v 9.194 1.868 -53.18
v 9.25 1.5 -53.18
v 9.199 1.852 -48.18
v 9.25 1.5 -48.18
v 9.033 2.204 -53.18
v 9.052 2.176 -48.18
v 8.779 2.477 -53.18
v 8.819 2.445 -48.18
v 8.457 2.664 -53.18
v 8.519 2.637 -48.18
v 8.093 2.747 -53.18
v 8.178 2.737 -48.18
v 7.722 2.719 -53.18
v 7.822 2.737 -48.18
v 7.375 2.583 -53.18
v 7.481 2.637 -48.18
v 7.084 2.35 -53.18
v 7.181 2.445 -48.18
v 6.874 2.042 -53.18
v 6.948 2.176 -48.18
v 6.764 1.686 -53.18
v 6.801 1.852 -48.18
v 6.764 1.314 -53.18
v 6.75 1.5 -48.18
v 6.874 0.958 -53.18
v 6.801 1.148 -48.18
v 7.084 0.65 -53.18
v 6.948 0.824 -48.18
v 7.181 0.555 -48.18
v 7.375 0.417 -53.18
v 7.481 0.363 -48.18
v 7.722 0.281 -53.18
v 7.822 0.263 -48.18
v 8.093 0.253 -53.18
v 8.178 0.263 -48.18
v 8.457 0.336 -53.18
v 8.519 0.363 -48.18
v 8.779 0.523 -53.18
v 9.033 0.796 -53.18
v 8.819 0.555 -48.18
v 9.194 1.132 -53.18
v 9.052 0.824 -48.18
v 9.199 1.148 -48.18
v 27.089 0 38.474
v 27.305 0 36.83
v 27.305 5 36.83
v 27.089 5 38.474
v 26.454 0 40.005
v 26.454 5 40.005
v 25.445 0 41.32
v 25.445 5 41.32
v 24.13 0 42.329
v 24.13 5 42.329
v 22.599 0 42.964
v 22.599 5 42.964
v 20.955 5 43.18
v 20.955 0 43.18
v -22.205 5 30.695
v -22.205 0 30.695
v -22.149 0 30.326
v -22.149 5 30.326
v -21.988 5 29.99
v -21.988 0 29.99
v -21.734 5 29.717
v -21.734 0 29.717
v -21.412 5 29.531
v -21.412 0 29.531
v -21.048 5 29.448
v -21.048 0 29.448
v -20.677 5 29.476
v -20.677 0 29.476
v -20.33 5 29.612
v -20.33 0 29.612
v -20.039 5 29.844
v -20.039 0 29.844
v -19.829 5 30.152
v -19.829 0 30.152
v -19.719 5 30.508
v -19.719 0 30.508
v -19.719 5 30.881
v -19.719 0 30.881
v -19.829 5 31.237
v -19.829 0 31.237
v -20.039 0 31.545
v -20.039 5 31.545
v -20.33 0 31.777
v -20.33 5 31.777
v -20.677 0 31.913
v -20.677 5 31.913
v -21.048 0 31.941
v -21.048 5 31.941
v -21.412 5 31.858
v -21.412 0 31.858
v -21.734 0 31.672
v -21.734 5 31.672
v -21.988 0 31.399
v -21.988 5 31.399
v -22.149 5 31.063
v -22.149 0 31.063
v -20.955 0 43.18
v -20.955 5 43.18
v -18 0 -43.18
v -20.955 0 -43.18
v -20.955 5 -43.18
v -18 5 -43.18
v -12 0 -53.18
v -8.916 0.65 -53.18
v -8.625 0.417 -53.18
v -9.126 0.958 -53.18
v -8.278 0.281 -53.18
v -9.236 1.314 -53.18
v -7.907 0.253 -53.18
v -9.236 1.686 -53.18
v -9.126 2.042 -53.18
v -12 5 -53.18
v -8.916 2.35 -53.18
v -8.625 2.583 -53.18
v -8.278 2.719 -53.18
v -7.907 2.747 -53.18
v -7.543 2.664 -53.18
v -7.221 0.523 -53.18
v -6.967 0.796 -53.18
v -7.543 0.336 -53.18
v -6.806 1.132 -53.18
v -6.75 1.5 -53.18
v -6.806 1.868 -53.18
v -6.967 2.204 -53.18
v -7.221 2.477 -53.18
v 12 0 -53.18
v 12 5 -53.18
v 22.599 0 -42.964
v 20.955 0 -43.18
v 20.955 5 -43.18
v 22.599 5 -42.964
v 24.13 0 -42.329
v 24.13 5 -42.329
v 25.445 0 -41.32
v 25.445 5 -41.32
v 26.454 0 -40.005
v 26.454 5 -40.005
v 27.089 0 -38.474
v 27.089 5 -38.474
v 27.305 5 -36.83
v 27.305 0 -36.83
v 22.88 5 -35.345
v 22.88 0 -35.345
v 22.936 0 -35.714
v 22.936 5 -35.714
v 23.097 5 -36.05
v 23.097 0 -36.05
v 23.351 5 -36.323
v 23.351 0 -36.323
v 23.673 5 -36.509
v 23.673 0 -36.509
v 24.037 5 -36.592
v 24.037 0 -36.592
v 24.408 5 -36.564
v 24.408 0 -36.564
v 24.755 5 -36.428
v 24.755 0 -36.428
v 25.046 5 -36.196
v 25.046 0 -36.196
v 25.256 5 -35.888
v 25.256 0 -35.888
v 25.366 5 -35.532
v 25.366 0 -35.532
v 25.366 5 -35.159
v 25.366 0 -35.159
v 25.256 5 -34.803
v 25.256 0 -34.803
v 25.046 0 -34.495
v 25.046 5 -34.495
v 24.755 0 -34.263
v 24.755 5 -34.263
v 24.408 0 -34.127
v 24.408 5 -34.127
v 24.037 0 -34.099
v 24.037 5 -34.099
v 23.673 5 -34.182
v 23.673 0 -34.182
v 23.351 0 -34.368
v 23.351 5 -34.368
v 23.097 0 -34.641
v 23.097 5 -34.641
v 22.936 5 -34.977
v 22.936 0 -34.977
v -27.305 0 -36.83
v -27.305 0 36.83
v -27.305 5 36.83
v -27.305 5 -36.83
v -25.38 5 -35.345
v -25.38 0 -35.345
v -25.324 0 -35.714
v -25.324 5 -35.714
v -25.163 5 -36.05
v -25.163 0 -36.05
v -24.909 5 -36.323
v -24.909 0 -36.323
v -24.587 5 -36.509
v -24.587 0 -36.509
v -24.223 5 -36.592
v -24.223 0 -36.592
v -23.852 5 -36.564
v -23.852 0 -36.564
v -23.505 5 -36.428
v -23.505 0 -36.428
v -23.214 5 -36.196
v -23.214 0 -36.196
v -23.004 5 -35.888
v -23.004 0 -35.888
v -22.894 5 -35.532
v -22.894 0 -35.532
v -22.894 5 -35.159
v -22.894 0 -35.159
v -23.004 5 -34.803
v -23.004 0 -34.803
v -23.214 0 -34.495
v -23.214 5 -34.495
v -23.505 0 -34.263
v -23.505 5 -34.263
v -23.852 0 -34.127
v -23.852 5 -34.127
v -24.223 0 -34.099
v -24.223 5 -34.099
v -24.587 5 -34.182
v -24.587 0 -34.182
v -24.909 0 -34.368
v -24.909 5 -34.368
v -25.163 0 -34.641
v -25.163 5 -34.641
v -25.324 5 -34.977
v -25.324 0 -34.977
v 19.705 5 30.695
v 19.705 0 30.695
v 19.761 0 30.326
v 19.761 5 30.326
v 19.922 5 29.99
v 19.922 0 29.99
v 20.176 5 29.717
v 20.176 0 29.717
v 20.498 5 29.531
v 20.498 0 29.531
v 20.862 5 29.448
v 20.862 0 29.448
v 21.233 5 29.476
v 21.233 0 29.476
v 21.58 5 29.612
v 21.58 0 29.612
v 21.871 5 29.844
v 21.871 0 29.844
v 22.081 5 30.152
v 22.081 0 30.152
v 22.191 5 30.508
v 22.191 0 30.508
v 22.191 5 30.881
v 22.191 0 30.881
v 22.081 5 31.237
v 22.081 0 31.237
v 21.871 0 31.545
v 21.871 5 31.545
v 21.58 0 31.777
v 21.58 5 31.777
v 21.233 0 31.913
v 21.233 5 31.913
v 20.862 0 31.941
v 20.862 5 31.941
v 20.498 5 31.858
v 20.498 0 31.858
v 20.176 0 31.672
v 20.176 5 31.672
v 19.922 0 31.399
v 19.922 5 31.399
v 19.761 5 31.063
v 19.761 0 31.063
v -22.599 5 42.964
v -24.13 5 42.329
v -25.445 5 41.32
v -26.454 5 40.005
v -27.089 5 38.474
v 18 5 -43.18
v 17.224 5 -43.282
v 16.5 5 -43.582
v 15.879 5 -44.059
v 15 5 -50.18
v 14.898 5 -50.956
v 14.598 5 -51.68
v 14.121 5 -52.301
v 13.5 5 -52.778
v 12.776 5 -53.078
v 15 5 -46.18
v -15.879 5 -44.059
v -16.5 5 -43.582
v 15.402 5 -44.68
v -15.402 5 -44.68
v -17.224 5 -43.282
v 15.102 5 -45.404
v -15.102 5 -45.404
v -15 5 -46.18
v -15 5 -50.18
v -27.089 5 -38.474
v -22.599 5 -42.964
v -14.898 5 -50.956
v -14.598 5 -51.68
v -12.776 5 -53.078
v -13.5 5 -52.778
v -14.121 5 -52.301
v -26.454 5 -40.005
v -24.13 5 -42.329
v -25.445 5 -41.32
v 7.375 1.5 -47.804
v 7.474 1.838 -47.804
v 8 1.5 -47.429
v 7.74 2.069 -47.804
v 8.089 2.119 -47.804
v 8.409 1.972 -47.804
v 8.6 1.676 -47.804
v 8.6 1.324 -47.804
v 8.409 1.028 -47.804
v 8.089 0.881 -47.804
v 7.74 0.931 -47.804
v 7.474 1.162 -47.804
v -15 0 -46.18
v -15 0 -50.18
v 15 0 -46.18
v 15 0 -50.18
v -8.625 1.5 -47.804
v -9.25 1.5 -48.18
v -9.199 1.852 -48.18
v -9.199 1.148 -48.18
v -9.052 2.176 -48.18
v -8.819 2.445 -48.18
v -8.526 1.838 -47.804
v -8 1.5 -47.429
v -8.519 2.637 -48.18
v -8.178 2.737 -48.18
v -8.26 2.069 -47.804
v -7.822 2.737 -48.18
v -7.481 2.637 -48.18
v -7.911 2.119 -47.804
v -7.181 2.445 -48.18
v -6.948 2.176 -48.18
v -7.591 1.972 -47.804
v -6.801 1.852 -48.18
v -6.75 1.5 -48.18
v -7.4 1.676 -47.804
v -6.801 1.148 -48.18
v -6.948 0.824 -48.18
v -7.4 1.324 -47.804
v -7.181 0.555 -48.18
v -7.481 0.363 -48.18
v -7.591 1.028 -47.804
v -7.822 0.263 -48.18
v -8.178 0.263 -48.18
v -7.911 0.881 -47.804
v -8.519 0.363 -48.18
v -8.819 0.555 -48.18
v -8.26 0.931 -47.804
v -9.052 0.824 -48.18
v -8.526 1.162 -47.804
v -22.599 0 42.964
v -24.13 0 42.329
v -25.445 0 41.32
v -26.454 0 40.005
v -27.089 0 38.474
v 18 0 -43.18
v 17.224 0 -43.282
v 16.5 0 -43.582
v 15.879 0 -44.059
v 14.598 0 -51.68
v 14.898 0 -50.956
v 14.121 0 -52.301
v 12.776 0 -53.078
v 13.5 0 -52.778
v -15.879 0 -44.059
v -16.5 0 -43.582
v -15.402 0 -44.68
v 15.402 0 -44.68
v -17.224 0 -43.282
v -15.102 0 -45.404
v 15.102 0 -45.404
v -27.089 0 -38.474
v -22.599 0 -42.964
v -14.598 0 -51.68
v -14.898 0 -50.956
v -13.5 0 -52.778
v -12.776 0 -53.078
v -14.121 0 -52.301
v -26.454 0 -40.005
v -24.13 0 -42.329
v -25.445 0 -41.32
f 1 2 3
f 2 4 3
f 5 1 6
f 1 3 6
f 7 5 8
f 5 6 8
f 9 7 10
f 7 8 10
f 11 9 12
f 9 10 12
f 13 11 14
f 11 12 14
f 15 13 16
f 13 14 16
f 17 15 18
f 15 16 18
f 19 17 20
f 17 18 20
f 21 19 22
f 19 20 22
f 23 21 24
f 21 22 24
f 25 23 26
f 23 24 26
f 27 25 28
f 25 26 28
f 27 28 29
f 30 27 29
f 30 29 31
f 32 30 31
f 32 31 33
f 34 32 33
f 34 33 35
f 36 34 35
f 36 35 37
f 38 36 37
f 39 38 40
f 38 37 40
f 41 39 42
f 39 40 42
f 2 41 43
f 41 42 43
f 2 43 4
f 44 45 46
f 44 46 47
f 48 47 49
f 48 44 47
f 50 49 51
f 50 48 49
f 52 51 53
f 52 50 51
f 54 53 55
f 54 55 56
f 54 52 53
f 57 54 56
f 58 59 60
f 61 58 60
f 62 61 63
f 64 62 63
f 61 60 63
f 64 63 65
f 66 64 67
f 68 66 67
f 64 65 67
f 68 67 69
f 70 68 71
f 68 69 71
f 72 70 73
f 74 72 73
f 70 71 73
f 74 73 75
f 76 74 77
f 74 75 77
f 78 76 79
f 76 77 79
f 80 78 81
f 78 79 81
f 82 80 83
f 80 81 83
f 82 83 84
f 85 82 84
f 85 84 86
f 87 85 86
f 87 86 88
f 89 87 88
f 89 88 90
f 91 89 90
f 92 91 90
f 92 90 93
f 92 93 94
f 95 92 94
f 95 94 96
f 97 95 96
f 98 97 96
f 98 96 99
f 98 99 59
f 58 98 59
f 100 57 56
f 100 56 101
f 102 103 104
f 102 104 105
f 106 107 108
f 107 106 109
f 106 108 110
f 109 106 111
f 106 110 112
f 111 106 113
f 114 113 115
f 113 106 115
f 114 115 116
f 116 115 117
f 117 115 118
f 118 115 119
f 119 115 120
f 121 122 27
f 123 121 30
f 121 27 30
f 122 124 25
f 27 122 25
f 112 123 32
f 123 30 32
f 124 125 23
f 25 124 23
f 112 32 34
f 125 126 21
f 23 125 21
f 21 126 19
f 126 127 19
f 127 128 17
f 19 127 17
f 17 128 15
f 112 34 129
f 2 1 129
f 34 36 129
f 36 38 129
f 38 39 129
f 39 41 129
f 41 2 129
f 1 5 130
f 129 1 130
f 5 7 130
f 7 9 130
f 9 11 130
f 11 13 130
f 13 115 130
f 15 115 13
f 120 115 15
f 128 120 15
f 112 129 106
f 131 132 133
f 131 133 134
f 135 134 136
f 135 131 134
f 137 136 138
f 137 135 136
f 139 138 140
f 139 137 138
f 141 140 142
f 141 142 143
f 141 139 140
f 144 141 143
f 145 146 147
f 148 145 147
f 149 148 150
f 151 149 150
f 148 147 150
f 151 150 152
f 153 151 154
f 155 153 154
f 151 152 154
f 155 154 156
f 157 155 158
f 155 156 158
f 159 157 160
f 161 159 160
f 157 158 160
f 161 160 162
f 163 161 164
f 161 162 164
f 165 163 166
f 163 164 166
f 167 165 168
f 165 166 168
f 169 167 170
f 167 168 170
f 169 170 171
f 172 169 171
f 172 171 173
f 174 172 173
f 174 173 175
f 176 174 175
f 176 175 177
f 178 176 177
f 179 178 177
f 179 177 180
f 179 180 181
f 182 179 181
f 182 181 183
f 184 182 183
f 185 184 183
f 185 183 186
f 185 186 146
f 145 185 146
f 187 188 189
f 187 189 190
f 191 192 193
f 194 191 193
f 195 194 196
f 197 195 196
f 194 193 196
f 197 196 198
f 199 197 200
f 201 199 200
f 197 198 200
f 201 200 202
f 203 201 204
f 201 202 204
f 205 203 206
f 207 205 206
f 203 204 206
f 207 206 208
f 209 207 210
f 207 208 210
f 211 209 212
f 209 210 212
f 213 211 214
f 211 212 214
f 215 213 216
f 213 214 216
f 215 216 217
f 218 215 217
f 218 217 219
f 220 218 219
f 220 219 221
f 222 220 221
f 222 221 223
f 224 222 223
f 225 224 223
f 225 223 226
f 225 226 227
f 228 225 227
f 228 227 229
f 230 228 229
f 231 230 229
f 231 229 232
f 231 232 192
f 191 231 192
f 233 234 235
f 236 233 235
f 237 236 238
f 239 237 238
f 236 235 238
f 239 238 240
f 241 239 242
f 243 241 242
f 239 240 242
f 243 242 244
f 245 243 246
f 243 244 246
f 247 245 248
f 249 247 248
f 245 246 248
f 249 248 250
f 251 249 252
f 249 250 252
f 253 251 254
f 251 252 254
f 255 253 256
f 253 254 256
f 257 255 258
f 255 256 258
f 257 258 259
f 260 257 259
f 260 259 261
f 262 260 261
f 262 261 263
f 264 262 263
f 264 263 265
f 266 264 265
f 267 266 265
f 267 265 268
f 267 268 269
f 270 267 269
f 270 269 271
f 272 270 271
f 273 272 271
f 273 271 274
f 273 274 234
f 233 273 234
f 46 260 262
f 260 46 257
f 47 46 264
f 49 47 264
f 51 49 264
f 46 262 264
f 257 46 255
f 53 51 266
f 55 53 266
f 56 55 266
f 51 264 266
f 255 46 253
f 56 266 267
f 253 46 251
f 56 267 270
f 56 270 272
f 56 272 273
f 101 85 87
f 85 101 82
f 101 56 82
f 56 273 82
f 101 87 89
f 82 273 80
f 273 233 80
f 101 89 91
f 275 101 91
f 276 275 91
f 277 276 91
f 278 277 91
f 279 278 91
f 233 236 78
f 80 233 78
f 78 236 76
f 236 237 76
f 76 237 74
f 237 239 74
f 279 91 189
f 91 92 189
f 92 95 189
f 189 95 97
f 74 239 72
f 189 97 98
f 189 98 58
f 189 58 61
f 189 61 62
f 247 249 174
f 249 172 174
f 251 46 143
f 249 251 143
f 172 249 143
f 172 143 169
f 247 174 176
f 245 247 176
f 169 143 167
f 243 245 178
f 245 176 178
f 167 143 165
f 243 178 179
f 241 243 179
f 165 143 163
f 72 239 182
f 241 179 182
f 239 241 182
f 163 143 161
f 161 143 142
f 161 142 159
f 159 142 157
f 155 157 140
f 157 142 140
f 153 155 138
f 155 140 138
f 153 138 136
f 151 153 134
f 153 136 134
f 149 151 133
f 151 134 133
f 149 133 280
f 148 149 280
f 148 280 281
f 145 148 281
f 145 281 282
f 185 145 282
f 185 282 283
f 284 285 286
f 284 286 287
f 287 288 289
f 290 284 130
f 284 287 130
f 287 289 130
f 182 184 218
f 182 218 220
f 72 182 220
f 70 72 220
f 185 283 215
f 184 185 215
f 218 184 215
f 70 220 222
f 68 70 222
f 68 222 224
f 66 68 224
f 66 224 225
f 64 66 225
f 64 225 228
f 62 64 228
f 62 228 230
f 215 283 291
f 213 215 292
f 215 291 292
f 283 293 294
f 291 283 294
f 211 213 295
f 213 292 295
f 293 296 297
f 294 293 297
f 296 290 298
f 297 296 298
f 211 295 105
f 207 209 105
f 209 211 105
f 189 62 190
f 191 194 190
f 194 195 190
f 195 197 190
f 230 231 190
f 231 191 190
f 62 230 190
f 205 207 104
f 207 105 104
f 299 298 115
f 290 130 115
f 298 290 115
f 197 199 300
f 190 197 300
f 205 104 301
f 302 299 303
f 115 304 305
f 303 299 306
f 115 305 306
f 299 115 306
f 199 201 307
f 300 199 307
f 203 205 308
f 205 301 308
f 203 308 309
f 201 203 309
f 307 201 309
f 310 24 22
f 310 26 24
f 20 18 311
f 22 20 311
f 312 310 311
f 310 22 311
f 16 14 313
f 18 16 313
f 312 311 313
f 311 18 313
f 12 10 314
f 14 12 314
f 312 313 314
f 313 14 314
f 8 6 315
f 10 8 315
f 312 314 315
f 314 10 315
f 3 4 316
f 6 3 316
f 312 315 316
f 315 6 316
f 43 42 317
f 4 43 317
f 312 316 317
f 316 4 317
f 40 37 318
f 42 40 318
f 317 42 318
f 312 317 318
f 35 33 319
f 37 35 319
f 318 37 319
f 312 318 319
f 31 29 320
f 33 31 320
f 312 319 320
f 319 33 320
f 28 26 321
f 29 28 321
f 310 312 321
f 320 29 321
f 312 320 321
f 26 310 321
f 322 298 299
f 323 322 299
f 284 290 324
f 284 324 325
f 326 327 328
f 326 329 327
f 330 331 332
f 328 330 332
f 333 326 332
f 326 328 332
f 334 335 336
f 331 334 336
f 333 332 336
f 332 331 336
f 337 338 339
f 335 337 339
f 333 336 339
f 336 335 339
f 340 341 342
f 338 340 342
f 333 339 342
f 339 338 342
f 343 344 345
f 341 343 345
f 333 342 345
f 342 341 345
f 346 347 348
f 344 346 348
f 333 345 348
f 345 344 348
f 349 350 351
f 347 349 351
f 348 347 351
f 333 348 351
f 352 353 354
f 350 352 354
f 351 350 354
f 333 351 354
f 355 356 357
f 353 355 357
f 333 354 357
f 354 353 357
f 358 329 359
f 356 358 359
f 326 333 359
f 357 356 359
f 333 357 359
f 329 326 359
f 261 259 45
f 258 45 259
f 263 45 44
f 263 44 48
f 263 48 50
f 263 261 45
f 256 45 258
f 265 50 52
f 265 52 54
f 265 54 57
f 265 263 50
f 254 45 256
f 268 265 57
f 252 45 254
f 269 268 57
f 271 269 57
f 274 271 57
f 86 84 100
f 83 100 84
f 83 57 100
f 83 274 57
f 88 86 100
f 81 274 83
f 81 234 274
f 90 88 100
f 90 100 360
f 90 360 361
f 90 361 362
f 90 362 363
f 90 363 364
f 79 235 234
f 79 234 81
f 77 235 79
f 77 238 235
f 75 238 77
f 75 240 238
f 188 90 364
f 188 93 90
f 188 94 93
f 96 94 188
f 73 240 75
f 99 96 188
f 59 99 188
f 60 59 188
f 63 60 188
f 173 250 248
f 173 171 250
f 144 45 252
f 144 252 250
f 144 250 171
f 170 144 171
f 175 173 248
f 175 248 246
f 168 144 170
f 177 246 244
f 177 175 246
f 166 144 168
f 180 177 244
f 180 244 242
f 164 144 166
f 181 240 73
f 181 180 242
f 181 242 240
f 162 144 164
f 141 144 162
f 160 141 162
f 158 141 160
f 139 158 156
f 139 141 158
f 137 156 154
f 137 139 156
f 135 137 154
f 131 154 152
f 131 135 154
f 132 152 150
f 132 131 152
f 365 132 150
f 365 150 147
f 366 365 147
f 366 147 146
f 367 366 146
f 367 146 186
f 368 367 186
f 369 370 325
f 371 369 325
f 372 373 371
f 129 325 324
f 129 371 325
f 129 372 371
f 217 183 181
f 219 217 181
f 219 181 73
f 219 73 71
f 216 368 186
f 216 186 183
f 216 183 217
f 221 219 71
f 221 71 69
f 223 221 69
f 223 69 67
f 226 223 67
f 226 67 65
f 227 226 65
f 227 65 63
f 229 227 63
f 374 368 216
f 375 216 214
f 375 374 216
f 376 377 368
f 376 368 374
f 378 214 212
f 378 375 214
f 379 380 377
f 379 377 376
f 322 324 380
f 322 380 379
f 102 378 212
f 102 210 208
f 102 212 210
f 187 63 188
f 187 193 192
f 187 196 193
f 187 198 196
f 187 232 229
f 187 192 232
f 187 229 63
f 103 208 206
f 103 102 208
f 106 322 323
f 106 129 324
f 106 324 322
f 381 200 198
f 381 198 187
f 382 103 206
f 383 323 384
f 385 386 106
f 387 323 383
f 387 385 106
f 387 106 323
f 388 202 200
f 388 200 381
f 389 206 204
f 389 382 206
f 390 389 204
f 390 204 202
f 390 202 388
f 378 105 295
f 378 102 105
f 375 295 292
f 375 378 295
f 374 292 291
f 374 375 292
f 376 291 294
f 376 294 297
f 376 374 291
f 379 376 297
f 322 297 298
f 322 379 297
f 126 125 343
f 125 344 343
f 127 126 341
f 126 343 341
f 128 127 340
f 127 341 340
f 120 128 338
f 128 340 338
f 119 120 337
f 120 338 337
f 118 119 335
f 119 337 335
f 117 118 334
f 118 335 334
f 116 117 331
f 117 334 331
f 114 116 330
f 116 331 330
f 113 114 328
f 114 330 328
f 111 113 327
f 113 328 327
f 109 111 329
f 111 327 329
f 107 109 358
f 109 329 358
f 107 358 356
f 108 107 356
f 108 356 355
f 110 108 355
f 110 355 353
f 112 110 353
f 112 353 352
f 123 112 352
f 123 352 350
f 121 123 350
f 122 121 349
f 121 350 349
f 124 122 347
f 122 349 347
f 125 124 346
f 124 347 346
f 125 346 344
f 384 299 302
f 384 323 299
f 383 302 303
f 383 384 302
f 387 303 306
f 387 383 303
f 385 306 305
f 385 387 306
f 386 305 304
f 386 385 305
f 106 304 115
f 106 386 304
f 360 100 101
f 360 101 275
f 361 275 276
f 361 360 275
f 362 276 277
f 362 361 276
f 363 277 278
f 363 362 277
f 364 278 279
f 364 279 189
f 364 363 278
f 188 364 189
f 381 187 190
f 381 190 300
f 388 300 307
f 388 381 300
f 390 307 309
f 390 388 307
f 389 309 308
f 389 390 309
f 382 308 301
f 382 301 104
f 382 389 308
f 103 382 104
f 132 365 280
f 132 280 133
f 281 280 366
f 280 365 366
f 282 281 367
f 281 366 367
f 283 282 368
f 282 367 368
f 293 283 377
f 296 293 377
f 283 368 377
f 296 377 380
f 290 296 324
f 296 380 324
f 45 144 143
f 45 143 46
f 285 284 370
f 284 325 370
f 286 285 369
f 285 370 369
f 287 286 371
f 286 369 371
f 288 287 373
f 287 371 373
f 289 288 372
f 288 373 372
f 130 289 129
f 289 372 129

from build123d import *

# Parameters (mm, degrees)
BOSS_EXTRUDE1_DEPTH             = 5
TAP_DRILL_FOR_M3X0_5_TAP1_D     = 2.5
SKETCH5_W                       = 30
SKETCH5_H                       = 10
BOSS_EXTRUDE2_DEPTH             = 5
FILLET1_R                       = 3
TAP_DRILL_FOR_M3X0_5_TAP2_D     = 2.5
TAP_DRILL_FOR_M3X0_5_TAP2_DEPTH = 5
TAP_DRILL_FOR_M3X0_5_TAP2_TIP   = 0.751075774


with BuildPart() as part:
    # Sketch1 → Boss-Extrude1 (new body)
    with BuildSketch(Plane(origin=(0, 0, 0), x_dir=(1, 0, 0), z_dir=(0, 1, 0))):
        with BuildLine():
            Line((20.955, -43.18), (-20.955, -43.18))
            ThreePointArc((-20.955, -43.18), (-25.445128061, -41.320128061), (-27.305, -36.83))
            Line((-27.305, -36.83), (-27.305, 36.83))
            ThreePointArc((-27.305, 36.83), (-25.445128061, 41.320128061), (-20.955, 43.18))
            Line((-20.955, 43.18), (20.955, 43.18))
            ThreePointArc((20.955, 43.18), (25.445128061, 41.320128061), (27.305, 36.83))
            Line((27.305, 36.83), (27.305, -36.83))
            ThreePointArc((27.305, -36.83), (25.445128061, -41.320128061), (20.955, -43.18))
        make_face()
    extrude(amount=BOSS_EXTRUDE1_DEPTH)

    # Tap Drill for M3x0.5 Tap1 (through all)
    with Locations(Plane(origin=(0, 5, 0), x_dir=(1, 0, 0), z_dir=(0, 1, 0))):
        with Locations((-24.13, 35.345352113), (24.13, 35.345352113), (-20.955, -30.694647887), (20.955, -30.694647887)):
            Hole(TAP_DRILL_FOR_M3X0_5_TAP1_D / 2)

    # Sketch5 → Boss-Extrude2 (add)
    with BuildSketch(Plane(origin=(0, 5, 0), x_dir=(1, 0, 0), z_dir=(0, 1, 0))):
        with Locations((0, 48.18)):
            Rectangle(SKETCH5_W, SKETCH5_H)
    extrude(amount=-BOSS_EXTRUDE2_DEPTH)

    # Fillet1
    fillet1_edges = [part.edges().sort_by_distance(p)[0] for p in [
        (-15, 2.5, -43.18),
        (-15, 2.5, -53.18),
        (15, 2.5, -53.18),
        (15, 2.5, -43.18),
    ]]
    fillet(fillet1_edges, radius=FILLET1_R)

    # Tap Drill for M3x0.5 Tap2
    with Locations(Plane(origin=(0, 0, -53.18), x_dir=(-1, 0, 0), z_dir=(0, 0, -1))):
        with Locations((8, 1.5), (-8, 1.5)):
            Hole(TAP_DRILL_FOR_M3X0_5_TAP2_D / 2, depth=TAP_DRILL_FOR_M3X0_5_TAP2_DEPTH)
            with Locations((0, 0, -(TAP_DRILL_FOR_M3X0_5_TAP2_DEPTH + TAP_DRILL_FOR_M3X0_5_TAP2_TIP / 2))):  # 118° drill point
                Cone(0, TAP_DRILL_FOR_M3X0_5_TAP2_D / 2, TAP_DRILL_FOR_M3X0_5_TAP2_TIP, mode=Mode.SUBTRACT)


solid = part.part
